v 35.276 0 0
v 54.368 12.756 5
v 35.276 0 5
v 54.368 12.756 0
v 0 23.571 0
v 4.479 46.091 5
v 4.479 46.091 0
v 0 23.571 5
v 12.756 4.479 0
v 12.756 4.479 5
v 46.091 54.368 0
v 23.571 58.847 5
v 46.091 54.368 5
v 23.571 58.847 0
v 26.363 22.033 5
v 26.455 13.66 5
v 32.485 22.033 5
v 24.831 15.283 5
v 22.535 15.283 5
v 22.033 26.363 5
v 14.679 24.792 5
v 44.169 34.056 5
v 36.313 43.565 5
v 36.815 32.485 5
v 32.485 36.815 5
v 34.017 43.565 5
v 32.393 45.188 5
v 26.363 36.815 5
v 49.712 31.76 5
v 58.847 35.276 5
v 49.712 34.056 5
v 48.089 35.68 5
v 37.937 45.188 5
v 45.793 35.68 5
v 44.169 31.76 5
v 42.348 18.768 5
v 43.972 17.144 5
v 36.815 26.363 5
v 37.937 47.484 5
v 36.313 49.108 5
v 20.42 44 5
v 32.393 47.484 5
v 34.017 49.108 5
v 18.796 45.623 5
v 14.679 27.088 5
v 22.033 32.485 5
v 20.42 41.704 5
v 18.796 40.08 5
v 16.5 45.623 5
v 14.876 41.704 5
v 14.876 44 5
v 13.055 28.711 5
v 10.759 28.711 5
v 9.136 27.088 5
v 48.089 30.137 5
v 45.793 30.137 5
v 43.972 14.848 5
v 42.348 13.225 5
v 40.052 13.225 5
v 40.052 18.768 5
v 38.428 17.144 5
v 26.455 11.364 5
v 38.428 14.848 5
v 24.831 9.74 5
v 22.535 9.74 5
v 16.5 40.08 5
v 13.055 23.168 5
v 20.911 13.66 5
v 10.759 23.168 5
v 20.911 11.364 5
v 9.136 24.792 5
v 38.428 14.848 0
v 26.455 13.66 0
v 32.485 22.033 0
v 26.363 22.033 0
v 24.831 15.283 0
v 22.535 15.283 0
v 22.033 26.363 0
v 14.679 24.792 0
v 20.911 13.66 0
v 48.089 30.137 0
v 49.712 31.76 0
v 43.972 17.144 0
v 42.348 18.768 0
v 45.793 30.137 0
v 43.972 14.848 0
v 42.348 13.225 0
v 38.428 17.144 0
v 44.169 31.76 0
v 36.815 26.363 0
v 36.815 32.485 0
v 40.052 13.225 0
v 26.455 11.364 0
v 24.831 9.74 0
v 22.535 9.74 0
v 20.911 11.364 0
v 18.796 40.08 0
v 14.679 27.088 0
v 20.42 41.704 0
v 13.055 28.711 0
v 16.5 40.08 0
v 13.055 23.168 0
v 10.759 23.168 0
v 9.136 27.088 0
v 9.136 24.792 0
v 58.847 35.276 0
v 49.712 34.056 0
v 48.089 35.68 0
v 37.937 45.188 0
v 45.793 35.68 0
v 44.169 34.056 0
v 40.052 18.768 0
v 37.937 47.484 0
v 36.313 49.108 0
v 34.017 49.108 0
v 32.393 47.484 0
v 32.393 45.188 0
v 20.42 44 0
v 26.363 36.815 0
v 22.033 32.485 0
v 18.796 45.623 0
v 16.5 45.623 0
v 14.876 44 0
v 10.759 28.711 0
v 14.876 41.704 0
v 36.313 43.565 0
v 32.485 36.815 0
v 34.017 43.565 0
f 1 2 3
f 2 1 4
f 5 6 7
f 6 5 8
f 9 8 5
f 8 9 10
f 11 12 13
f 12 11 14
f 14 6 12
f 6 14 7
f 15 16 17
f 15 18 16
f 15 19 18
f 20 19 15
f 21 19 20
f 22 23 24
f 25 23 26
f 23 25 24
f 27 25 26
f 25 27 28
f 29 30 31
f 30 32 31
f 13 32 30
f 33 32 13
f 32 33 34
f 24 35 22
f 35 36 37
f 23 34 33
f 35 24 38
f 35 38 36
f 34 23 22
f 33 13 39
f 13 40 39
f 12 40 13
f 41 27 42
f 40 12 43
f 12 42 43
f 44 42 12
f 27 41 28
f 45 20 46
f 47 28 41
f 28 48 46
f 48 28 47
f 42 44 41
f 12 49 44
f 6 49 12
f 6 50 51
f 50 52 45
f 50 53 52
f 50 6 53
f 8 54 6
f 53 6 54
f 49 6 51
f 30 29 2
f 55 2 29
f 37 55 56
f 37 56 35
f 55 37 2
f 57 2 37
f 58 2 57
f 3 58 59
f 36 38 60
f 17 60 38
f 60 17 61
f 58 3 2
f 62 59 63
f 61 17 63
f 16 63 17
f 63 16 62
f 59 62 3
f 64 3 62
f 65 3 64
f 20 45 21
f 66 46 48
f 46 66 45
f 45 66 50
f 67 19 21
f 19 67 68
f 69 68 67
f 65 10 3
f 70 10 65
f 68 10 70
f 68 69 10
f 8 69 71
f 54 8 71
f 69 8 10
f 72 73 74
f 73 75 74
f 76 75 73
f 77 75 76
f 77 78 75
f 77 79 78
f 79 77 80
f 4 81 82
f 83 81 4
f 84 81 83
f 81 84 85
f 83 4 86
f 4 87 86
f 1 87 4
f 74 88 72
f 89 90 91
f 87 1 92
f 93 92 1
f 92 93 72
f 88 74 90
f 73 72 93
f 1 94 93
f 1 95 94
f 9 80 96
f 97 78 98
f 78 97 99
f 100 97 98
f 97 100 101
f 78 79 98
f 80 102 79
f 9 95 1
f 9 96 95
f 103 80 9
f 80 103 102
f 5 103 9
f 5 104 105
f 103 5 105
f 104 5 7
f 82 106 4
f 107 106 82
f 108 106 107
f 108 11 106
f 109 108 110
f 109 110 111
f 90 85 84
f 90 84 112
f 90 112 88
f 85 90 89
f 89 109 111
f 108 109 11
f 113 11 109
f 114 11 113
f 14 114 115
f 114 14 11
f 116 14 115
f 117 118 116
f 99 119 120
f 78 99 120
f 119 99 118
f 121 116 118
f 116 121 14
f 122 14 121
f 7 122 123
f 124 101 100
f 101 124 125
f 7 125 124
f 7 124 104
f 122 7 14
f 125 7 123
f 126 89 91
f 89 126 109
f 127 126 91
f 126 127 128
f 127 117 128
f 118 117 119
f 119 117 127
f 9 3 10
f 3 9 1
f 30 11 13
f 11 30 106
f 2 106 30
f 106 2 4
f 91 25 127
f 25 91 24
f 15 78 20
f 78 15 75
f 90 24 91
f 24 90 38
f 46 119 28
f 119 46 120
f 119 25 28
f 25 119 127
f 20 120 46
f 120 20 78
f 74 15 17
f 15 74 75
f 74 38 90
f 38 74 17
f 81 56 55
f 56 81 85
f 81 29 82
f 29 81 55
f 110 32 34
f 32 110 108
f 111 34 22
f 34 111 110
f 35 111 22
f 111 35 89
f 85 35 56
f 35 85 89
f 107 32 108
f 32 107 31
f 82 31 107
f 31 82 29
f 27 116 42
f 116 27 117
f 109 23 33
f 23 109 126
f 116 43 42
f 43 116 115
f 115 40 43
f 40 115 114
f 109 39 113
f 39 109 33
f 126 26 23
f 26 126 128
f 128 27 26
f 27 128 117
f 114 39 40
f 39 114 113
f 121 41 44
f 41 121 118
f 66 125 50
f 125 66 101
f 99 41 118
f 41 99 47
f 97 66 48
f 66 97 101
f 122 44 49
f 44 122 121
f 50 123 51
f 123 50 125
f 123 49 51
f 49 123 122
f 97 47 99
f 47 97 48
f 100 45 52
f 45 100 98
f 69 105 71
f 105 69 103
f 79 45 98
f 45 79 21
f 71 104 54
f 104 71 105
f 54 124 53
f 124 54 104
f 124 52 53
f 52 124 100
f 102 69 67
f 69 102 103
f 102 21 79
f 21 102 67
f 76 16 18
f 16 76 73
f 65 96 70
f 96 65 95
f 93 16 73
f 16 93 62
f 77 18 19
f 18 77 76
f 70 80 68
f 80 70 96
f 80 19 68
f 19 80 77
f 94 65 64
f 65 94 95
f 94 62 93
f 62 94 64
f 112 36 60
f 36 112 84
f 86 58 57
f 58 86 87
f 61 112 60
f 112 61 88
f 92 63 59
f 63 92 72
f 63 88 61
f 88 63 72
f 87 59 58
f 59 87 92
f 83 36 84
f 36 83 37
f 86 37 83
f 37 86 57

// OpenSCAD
$fn = 32;

// ----------------------------------------------------------------------
// Polygon plate: 8-gon R30, 6 bolt windows
// ----------------------------------------------------------------------

// --- parameters (mm) ---
sides = 8;                // number of polygon sides
plate_r = 30;             // circumscribed radius of the polygon
bore_r = 8;               // centre bore radius
bolts = 6;                // number of bolt windows
ring_r = 17.86;           // bolt-circle radius
bolt_r = 3;               // bolt window radius
plate_t = 5;              // plate thickness, Z (extrusion height)

plate_d = 2 * plate_r;  // circumscribed diameter
bore_d = 2 * bore_r;  // centre bore diameter
bolt_d = 2 * bolt_r;  // bolt window diameter
ring_d = 2 * ring_r;  // bolt-circle diameter

profile = [[58.847, 35.276], [46.091, 54.368], [23.571, 58.847], [4.479, 46.091], [0, 23.571], [12.756, 4.479], [35.276, 0], [54.368, 12.756]];  // primary outline, 8 points, counter clockwise
void_1 = [[36.815, 32.485], [32.485, 36.815], [26.363, 36.815], [22.033, 32.485], [22.033, 26.363], [26.363, 22.033], [32.485, 22.033], [36.815, 26.363]];  // centre bore, 8 points
void_2 = [[49.712, 34.056], [48.089, 35.68], [45.793, 35.68], [44.169, 34.056], [44.169, 31.76], [45.793, 30.137], [48.089, 30.137], [49.712, 31.76]];  // bolt window 1, 8 points
void_3 = [[37.937, 47.484], [36.313, 49.108], [34.017, 49.108], [32.393, 47.484], [32.393, 45.188], [34.017, 43.565], [36.313, 43.565], [37.937, 45.188]];  // bolt window 2, 8 points
void_4 = [[20.42, 44], [18.796, 45.623], [16.5, 45.623], [14.876, 44], [14.876, 41.704], [16.5, 40.08], [18.796, 40.08], [20.42, 41.704]];  // bolt window 3, 8 points
void_5 = [[14.679, 27.088], [13.055, 28.711], [10.759, 28.711], [9.136, 27.088], [9.136, 24.792], [10.759, 23.168], [13.055, 23.168], [14.679, 24.792]];  // bolt window 4, 8 points
void_6 = [[26.455, 13.66], [24.831, 15.283], [22.535, 15.283], [20.911, 13.66], [20.911, 11.364], [22.535, 9.74], [24.831, 9.74], [26.455, 11.364]];  // bolt window 5, 8 points
void_7 = [[43.972, 17.144], [42.348, 18.768], [40.052, 18.768], [38.428, 17.144], [38.428, 14.848], [40.052, 13.225], [42.348, 13.225], [43.972, 14.848]];  // bolt window 6, 8 points

// --- the one profile operation ---
difference() {
  linear_extrude(height = plate_t) polygon(points = profile);
  translate([0, 0, -1])
    linear_extrude(height = plate_t + 2) polygon(points = void_1);
  translate([0, 0, -1])
    linear_extrude(height = plate_t + 2) polygon(points = void_2);
  translate([0, 0, -1])
    linear_extrude(height = plate_t + 2) polygon(points = void_3);
  translate([0, 0, -1])
    linear_extrude(height = plate_t + 2) polygon(points = void_4);
  translate([0, 0, -1])
    linear_extrude(height = plate_t + 2) polygon(points = void_5);
  translate([0, 0, -1])
    linear_extrude(height = plate_t + 2) polygon(points = void_6);
  translate([0, 0, -1])
    linear_extrude(height = plate_t + 2) polygon(points = void_7);
}
